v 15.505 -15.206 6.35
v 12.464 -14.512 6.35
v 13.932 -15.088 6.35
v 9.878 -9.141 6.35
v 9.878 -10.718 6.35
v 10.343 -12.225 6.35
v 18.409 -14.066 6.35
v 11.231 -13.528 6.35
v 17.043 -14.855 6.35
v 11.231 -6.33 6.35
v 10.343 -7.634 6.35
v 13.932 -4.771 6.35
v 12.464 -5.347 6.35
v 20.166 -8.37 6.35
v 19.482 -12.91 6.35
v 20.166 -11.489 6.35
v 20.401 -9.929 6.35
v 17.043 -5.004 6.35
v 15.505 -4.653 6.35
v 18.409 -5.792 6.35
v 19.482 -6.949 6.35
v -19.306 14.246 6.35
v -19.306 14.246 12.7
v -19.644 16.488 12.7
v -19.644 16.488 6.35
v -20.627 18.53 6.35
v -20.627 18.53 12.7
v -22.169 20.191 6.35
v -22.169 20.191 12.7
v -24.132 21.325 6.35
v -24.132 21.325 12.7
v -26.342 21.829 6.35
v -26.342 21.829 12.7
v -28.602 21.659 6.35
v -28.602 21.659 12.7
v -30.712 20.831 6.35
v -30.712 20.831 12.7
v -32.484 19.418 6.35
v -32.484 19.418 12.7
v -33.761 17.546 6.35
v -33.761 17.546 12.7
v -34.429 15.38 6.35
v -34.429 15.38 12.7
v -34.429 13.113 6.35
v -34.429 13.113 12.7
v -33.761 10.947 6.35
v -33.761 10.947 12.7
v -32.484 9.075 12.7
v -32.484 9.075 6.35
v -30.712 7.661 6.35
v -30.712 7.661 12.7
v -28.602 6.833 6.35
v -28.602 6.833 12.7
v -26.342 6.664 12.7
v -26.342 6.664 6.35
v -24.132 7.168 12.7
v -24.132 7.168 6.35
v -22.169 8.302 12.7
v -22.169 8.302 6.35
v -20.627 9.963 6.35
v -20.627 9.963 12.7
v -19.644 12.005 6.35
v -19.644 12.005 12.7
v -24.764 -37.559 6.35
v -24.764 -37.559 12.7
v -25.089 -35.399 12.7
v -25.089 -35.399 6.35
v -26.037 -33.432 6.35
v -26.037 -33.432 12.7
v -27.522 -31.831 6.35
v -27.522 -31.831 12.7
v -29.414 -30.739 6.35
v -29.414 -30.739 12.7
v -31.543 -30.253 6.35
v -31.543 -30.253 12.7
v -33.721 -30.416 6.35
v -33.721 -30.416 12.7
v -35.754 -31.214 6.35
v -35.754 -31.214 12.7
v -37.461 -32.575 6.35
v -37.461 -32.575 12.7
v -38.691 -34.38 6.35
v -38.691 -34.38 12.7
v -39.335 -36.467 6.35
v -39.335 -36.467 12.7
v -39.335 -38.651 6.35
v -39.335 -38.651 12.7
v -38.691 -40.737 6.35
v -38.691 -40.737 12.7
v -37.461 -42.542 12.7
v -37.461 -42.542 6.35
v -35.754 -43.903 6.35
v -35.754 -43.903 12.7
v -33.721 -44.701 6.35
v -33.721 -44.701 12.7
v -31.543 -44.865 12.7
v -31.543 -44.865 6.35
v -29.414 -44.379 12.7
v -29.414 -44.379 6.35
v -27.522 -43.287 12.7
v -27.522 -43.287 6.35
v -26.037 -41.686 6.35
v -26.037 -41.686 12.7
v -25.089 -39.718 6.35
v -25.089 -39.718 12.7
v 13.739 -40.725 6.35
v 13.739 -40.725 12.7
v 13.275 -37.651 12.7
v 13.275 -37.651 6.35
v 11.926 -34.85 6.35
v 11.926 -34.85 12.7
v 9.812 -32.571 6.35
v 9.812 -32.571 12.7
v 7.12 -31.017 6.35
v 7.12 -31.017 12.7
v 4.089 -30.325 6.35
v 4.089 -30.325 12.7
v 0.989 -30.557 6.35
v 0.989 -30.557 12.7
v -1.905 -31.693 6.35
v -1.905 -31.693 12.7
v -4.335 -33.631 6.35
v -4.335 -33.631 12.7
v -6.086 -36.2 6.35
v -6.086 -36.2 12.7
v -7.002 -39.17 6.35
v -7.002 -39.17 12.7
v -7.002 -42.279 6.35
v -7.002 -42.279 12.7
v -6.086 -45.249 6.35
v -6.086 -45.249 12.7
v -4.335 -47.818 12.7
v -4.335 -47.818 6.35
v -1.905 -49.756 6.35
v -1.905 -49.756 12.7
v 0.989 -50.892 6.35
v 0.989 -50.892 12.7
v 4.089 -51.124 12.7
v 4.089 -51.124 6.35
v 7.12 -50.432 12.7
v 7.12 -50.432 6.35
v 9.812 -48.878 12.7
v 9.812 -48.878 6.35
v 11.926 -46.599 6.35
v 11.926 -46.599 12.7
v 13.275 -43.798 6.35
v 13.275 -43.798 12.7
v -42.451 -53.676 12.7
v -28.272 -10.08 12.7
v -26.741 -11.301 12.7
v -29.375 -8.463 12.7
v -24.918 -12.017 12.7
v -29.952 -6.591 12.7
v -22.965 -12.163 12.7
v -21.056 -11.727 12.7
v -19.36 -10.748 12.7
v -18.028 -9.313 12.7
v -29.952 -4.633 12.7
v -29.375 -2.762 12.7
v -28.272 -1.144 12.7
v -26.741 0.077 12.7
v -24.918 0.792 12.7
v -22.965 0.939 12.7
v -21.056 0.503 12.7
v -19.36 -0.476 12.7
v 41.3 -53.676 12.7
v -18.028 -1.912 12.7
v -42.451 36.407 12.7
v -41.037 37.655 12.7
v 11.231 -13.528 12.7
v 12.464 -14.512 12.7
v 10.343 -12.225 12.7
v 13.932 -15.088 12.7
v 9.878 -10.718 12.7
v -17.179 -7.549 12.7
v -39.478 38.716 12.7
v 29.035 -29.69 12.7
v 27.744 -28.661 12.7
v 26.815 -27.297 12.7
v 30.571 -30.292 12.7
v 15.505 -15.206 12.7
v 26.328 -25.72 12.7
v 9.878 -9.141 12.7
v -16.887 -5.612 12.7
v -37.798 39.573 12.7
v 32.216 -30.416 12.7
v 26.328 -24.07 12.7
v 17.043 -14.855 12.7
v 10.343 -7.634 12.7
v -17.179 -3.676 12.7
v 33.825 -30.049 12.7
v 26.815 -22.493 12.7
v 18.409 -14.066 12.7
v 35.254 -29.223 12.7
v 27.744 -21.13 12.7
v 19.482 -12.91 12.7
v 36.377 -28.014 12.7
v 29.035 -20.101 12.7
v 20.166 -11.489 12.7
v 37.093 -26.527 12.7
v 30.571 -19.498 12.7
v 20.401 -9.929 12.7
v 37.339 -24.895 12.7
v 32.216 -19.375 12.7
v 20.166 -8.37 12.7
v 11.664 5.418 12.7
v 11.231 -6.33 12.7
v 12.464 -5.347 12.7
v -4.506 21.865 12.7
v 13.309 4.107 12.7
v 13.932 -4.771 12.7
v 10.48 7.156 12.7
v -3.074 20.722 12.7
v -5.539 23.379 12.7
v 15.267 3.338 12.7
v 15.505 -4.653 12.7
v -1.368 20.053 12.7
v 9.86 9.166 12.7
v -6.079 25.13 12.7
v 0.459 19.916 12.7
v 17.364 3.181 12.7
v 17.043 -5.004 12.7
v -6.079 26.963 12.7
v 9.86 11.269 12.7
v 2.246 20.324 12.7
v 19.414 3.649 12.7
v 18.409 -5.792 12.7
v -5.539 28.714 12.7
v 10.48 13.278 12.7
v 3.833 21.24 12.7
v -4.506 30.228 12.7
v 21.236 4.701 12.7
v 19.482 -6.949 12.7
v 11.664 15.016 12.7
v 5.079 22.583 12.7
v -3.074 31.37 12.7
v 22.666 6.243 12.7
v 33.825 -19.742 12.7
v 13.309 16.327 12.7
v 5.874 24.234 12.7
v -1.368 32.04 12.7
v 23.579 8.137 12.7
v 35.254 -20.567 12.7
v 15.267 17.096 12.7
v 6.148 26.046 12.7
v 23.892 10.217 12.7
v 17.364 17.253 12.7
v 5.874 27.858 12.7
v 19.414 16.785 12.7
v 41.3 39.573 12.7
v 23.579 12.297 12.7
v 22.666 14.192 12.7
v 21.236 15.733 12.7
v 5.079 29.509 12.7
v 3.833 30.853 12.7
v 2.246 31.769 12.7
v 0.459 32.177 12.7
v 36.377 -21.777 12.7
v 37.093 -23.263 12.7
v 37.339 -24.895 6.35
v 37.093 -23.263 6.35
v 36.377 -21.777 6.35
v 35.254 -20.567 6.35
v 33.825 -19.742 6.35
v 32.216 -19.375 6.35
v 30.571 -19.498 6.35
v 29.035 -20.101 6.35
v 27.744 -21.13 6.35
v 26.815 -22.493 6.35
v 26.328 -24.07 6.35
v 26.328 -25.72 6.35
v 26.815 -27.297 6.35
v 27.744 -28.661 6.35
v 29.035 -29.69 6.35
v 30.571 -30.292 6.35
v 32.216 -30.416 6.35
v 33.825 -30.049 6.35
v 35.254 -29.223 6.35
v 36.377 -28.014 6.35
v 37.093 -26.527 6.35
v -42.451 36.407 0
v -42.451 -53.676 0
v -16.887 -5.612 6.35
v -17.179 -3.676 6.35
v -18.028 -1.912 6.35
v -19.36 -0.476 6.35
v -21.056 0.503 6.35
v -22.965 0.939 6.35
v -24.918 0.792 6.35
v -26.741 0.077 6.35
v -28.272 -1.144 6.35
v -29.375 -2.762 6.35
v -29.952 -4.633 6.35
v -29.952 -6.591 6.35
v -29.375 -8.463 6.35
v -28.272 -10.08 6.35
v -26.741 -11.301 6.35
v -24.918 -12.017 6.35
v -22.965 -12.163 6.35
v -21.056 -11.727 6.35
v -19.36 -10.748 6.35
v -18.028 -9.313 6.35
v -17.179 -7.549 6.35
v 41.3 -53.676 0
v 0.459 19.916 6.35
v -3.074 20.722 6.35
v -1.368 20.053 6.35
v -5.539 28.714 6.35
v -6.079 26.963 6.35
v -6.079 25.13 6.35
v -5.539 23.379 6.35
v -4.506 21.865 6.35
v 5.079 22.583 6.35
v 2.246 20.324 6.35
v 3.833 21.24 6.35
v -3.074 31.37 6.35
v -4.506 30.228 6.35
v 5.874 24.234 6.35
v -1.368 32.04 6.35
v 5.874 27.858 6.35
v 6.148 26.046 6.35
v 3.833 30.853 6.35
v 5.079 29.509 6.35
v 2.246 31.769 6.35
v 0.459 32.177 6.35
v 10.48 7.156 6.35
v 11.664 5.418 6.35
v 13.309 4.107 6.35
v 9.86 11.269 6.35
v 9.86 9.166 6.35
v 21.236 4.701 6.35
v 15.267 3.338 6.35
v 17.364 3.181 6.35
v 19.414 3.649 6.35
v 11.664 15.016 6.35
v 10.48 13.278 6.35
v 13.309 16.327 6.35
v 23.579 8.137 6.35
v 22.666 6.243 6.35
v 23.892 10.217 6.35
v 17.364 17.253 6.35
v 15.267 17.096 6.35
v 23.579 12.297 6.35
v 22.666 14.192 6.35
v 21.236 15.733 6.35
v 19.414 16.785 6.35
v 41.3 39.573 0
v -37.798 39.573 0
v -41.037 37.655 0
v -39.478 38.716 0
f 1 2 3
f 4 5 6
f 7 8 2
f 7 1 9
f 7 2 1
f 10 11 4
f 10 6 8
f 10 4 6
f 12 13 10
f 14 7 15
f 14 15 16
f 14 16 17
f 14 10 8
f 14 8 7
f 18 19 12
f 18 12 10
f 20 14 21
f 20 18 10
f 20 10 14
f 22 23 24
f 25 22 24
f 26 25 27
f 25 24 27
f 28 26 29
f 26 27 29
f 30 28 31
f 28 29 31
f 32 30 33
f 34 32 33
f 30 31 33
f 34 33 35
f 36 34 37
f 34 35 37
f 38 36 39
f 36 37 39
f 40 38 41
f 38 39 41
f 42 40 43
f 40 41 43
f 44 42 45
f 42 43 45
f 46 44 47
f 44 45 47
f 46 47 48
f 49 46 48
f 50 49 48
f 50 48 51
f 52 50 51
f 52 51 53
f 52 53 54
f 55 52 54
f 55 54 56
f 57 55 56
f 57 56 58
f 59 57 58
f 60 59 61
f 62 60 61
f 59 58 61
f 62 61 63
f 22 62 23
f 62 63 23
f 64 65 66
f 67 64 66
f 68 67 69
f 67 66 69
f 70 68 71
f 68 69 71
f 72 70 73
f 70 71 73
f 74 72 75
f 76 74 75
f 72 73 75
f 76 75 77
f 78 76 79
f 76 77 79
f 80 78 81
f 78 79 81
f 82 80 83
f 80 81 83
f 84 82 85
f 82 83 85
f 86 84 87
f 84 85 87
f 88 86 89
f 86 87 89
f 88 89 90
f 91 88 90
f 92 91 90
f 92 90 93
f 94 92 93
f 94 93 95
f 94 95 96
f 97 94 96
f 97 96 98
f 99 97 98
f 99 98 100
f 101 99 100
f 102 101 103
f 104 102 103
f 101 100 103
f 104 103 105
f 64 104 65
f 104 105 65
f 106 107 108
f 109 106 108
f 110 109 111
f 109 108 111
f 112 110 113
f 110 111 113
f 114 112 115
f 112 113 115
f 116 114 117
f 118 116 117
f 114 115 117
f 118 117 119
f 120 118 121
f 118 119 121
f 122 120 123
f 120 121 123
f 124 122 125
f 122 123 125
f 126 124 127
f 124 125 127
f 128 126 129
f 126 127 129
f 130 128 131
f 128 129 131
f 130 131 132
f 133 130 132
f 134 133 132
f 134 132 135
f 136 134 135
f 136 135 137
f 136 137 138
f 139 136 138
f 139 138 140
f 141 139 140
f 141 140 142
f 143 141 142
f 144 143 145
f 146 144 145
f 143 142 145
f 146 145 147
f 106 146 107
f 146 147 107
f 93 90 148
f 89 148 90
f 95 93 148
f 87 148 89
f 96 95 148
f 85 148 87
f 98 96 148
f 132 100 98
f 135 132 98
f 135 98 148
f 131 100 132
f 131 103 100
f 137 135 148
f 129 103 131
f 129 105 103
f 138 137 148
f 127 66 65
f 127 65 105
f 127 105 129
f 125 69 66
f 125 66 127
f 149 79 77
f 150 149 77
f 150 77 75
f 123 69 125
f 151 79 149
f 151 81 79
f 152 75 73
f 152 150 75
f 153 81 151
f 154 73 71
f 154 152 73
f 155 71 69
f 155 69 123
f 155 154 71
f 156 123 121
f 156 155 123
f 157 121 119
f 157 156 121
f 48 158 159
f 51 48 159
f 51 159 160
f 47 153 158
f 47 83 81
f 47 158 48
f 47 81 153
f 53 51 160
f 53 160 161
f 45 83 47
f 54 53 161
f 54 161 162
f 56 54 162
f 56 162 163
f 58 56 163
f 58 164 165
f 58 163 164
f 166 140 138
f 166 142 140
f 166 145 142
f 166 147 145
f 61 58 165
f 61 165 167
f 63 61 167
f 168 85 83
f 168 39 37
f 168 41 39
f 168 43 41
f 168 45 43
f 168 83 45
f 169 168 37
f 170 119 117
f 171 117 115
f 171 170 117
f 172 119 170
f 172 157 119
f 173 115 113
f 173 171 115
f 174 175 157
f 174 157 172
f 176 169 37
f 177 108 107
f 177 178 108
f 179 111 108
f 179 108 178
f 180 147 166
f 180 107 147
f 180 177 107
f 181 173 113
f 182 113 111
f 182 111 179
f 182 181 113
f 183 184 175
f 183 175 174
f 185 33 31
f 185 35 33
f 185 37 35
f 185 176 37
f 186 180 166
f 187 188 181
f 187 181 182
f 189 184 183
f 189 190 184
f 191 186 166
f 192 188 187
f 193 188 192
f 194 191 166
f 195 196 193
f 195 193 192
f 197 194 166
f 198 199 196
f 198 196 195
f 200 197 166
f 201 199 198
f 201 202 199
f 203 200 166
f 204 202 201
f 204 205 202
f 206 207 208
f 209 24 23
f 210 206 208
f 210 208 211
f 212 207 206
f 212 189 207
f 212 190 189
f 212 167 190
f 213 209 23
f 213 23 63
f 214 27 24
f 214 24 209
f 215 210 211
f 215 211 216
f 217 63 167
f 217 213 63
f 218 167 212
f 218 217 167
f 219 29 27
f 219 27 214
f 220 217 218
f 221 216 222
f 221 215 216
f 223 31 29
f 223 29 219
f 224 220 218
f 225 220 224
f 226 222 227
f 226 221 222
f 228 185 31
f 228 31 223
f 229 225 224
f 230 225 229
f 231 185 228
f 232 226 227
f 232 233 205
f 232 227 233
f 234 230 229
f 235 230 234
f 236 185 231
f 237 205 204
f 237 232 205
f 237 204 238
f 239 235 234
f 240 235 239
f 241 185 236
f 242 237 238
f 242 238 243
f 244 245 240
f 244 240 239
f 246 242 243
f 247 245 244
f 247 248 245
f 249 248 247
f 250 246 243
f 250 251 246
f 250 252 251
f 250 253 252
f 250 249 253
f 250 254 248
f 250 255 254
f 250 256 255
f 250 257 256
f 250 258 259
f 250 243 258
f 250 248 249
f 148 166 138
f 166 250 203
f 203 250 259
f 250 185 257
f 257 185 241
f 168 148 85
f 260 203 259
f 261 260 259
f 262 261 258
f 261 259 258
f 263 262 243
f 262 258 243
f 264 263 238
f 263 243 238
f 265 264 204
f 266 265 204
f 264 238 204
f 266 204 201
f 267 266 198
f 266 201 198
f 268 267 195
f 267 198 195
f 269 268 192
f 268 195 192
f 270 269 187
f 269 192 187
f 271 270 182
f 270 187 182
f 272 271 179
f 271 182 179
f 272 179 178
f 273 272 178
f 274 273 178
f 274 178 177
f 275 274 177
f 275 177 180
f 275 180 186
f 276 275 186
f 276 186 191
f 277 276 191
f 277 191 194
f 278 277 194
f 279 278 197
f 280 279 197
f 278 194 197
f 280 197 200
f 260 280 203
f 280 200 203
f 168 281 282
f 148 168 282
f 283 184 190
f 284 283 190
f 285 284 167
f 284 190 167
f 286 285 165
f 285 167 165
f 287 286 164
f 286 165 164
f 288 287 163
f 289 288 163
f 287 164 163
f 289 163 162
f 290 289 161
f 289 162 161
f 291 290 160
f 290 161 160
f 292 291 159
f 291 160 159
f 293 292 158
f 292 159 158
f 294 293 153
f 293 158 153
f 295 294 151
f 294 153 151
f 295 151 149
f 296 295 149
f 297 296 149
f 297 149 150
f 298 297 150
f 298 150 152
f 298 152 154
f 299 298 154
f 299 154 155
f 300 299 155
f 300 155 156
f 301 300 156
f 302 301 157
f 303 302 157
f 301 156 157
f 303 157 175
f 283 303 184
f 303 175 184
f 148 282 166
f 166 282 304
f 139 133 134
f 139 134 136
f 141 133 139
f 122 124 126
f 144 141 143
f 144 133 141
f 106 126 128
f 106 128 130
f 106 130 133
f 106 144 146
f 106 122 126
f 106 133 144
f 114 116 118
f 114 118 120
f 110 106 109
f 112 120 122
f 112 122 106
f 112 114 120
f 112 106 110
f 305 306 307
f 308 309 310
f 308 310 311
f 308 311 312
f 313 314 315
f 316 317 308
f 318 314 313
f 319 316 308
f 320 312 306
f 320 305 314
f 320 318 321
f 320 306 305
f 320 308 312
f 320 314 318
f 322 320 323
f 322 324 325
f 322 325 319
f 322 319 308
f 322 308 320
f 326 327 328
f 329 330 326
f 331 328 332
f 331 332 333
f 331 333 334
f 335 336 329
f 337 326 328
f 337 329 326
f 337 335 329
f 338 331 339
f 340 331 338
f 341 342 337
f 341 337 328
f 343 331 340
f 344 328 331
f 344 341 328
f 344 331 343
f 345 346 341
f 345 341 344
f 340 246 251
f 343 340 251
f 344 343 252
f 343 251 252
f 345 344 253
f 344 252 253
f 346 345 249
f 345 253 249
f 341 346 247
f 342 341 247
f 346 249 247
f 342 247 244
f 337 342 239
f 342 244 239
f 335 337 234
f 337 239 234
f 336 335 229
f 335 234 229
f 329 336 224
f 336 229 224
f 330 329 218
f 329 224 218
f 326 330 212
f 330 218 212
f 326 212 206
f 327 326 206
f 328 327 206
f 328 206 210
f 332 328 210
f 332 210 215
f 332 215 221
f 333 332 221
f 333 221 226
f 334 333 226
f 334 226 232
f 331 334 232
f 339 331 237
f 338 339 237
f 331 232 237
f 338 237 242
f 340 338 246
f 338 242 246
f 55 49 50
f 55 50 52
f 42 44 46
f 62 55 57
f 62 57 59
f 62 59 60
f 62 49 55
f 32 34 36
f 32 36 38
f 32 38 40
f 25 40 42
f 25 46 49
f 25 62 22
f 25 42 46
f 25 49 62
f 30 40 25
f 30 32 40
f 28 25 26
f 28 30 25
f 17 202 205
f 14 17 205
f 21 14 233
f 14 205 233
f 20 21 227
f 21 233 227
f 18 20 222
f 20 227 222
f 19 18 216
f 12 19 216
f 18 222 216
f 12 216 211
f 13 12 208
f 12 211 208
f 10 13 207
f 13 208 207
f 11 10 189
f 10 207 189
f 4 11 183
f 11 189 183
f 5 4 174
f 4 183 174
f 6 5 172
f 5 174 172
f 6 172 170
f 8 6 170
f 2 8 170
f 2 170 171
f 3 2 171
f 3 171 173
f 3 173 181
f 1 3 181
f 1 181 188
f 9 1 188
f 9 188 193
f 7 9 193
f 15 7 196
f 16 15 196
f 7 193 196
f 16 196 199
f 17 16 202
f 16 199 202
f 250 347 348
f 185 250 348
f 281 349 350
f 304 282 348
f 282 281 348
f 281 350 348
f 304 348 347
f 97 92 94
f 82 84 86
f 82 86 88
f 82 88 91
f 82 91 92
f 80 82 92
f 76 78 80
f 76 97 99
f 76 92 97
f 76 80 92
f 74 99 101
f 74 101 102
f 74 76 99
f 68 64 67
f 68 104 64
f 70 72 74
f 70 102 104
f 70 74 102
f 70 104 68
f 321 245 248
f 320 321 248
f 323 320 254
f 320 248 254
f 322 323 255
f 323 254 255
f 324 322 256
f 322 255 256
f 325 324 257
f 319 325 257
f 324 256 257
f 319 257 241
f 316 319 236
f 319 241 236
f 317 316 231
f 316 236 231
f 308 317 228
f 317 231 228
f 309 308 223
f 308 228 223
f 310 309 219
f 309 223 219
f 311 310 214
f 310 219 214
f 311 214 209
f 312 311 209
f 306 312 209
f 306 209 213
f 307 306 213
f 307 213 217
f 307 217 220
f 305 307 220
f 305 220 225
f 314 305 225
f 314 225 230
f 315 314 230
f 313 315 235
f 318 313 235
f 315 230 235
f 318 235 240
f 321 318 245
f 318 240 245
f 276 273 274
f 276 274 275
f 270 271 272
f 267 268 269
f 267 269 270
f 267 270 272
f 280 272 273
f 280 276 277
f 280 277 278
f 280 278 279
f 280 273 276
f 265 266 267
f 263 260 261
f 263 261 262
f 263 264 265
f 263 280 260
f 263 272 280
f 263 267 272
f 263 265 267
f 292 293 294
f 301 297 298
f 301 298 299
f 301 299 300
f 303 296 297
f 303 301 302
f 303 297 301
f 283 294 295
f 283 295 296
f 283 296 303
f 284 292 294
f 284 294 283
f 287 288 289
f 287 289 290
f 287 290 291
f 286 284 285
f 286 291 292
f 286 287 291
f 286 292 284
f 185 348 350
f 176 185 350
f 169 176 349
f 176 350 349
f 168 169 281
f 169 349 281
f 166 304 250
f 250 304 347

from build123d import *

# Parameters (mm, degrees)
F0_R     = 9.227752
F0_R_2   = 10.316944
F1_DEPTH = 12.7
F2_R     = 7.603738
F2_R_2   = 5.536052
F2_R_3   = 7.326338
F2_R_4   = 7.055645
F2_R_5   = 10.428743
F2_R_6   = 6.147535
F2_R_7   = 6.569287
F2_R_8   = 5.291244
F3_DEPTH = 6.35


with BuildPart() as f1:
    # F0 (on Top) → F1 (new body)
    with BuildSketch(Plane.XY):
        with BuildLine():
            Line((12.50172, 39.573293), (-25.80679, 39.573293))
            ThreePointArc((-25.80679, 39.573293), (-19.351501, 17.287133), (-42.451348, 15.109803))
            Line((-42.451348, 15.109803), (-42.451348, -53.675774))
            Line((-42.451348, -53.675774), (-26.046417, -53.675774))
            ThreePointArc((-26.046417, -53.675774), (-15.397607, -31.799477), (-4.748798, -53.675774))
            Line((-4.748798, -53.675774), (16.548831, -53.675774))
            Line((16.548831, -53.675774), (41.300125, -53.675774))
            Line((41.300125, -53.675774), (41.300125, -43.841226))
            ThreePointArc((41.300125, -43.841226), (32.662888, -31.226924), (41.300125, -18.612622))
            Line((41.300125, -18.612622), (41.300125, 39.573293))
            Line((41.300125, 39.573293), (31.532556, 39.573293))
            ThreePointArc((31.532556, 39.573293), (22.017138, 5.274796), (12.50172, 39.573293))
        make_face()
        with BuildLine():
            ThreePointArc((25.758617, -44.465989), (23.061133, -50.978291), (16.548831, -53.675774))
            ThreePointArc((16.548831, -53.675774), (10.036529, -37.953687), (25.758617, -44.465989))
        make_face(mode=Mode.SUBTRACT)
        with Locations((20.865915, -13.382968)):
            Circle(F0_R, mode=Mode.SUBTRACT)
        with Locations((-28.06106, -5.612212)):
            Circle(F0_R_2, mode=Mode.SUBTRACT)
        with BuildLine():
            Line((31.532556, 39.573293), (12.50172, 39.573293))
            ThreePointArc((12.50172, 39.573293), (22.017138, 5.274796), (31.532556, 39.573293))
        make_face()
        with BuildLine():
            Line((-25.80679, 39.573293), (-37.798287, 39.573293))
            ThreePointArc((-37.798287, 39.573293), (-40.274021, 38.209652), (-42.451348, 36.407427))
            Line((-42.451348, 36.407427), (-42.451348, 15.109803))
            ThreePointArc((-42.451348, 15.109803), (-19.351501, 17.287133), (-25.80679, 39.573293))
        make_face()
        with BuildLine():
            ThreePointArc((-4.748798, -53.675774), (-15.397607, -31.799477), (-26.046417, -53.675774))
            Line((-26.046417, -53.675774), (-4.748798, -53.675774))
        make_face()
        with Locations((-28.06106, -5.612212)):
            Circle(F0_R_2)
        with Locations((20.865915, -13.382968)):
            Circle(F0_R)
        with BuildLine():
            ThreePointArc((25.758617, -44.465989), (10.036529, -37.953687), (16.548831, -53.675774))
            ThreePointArc((16.548831, -53.675774), (23.061133, -50.978291), (25.758617, -44.465989))
        make_face()
        with BuildLine():
            Line((41.300125, -43.841226), (41.300125, -18.612622))
            ThreePointArc((41.300125, -18.612622), (32.662888, -31.226924), (41.300125, -43.841226))
        make_face()
    extrude(amount=F1_DEPTH)

    # F2 (on face) → F3 (cut)
    with BuildSketch(Plane.XY.offset(12.7)):
        with Locations((-26.909837, 14.246385)):
            Circle(F2_R)
        with Locations((31.802539, -24.895199)):
            Circle(F2_R_2)
        with Locations((-32.090344, -37.558652)):
            Circle(F2_R_3)
        with Locations((16.836636, 10.217104)):
            Circle(F2_R_4)
        with Locations((3.309769, -40.724512)):
            Circle(F2_R_5)
        with Locations((0, 26.046421)):
            Circle(F2_R_6)
        with Locations((-23.456169, -5.612212)):
            Circle(F2_R_7)
        with Locations((15.109802, -9.929299)):
            Circle(F2_R_8)
    extrude(amount=-F3_DEPTH, mode=Mode.SUBTRACT)


solid = f1.part
